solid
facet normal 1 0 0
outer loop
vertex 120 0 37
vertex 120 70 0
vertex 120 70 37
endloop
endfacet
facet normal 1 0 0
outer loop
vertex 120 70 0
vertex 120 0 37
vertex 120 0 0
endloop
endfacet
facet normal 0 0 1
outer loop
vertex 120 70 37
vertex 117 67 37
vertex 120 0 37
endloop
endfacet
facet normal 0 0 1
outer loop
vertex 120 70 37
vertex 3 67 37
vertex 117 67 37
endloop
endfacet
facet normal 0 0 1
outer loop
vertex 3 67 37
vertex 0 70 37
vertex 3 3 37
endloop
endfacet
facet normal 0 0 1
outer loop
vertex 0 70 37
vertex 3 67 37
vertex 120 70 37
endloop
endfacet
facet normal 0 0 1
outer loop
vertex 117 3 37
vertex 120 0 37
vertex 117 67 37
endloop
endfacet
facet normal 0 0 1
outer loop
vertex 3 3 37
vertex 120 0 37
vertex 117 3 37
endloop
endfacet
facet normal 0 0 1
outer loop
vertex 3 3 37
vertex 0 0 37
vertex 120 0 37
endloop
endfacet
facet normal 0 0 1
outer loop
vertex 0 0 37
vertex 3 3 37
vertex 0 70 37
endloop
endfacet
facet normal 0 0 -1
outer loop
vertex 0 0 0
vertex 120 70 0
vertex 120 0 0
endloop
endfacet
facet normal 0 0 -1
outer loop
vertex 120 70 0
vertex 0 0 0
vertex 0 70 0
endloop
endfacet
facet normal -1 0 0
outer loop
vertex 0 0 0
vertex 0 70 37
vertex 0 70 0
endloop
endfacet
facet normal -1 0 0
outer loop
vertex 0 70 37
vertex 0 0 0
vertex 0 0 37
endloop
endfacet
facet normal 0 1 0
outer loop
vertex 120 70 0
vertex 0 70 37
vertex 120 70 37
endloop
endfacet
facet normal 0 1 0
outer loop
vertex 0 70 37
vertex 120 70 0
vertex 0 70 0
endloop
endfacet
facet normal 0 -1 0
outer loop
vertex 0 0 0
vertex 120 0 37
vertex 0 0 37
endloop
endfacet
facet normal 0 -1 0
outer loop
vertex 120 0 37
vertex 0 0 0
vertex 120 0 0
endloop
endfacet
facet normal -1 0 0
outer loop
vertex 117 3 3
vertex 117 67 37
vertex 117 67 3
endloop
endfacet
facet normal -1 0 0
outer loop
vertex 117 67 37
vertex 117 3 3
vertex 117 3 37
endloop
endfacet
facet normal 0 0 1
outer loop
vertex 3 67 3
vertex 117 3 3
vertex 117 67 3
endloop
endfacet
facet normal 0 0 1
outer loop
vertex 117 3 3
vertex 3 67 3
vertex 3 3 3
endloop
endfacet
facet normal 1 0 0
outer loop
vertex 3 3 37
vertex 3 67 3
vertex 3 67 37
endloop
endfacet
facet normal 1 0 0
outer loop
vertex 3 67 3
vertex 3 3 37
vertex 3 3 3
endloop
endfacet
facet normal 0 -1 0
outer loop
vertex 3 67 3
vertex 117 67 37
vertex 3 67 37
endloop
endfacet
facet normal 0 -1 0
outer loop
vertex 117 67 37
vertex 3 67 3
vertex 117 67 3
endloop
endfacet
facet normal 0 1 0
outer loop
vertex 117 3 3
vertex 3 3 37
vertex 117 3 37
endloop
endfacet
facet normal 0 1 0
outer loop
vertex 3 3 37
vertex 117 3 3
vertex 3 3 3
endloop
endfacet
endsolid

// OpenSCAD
// Open-top storage bin / parts tray - a rectangular box open at the top, for small parts
// or bench organisation. NOVEL general part.
//
// @desc open-top storage bin / parts tray
// @prompt Design an open-top storage bin in OpenSCAD: {inner_l} by {inner_w} mm inside and {height} mm tall, with {wall} mm walls and a solid floor. Reply with a single complete OpenSCAD file.
// @param inner_l inner length, mm      [30:200]
// @param inner_w inner width, mm       [30:150]
// @param height  height, mm            [15:120]
// @param wall    wall thickness, mm    [1.6:4]

inner_l = 114;
inner_w = 64;
height  = 37;
wall    = 3;

difference() {
    cube([inner_l + 2 * wall, inner_w + 2 * wall, height]);
    translate([wall, wall, wall]) cube([inner_l, inner_w, height]);     // hollow, open top
}
